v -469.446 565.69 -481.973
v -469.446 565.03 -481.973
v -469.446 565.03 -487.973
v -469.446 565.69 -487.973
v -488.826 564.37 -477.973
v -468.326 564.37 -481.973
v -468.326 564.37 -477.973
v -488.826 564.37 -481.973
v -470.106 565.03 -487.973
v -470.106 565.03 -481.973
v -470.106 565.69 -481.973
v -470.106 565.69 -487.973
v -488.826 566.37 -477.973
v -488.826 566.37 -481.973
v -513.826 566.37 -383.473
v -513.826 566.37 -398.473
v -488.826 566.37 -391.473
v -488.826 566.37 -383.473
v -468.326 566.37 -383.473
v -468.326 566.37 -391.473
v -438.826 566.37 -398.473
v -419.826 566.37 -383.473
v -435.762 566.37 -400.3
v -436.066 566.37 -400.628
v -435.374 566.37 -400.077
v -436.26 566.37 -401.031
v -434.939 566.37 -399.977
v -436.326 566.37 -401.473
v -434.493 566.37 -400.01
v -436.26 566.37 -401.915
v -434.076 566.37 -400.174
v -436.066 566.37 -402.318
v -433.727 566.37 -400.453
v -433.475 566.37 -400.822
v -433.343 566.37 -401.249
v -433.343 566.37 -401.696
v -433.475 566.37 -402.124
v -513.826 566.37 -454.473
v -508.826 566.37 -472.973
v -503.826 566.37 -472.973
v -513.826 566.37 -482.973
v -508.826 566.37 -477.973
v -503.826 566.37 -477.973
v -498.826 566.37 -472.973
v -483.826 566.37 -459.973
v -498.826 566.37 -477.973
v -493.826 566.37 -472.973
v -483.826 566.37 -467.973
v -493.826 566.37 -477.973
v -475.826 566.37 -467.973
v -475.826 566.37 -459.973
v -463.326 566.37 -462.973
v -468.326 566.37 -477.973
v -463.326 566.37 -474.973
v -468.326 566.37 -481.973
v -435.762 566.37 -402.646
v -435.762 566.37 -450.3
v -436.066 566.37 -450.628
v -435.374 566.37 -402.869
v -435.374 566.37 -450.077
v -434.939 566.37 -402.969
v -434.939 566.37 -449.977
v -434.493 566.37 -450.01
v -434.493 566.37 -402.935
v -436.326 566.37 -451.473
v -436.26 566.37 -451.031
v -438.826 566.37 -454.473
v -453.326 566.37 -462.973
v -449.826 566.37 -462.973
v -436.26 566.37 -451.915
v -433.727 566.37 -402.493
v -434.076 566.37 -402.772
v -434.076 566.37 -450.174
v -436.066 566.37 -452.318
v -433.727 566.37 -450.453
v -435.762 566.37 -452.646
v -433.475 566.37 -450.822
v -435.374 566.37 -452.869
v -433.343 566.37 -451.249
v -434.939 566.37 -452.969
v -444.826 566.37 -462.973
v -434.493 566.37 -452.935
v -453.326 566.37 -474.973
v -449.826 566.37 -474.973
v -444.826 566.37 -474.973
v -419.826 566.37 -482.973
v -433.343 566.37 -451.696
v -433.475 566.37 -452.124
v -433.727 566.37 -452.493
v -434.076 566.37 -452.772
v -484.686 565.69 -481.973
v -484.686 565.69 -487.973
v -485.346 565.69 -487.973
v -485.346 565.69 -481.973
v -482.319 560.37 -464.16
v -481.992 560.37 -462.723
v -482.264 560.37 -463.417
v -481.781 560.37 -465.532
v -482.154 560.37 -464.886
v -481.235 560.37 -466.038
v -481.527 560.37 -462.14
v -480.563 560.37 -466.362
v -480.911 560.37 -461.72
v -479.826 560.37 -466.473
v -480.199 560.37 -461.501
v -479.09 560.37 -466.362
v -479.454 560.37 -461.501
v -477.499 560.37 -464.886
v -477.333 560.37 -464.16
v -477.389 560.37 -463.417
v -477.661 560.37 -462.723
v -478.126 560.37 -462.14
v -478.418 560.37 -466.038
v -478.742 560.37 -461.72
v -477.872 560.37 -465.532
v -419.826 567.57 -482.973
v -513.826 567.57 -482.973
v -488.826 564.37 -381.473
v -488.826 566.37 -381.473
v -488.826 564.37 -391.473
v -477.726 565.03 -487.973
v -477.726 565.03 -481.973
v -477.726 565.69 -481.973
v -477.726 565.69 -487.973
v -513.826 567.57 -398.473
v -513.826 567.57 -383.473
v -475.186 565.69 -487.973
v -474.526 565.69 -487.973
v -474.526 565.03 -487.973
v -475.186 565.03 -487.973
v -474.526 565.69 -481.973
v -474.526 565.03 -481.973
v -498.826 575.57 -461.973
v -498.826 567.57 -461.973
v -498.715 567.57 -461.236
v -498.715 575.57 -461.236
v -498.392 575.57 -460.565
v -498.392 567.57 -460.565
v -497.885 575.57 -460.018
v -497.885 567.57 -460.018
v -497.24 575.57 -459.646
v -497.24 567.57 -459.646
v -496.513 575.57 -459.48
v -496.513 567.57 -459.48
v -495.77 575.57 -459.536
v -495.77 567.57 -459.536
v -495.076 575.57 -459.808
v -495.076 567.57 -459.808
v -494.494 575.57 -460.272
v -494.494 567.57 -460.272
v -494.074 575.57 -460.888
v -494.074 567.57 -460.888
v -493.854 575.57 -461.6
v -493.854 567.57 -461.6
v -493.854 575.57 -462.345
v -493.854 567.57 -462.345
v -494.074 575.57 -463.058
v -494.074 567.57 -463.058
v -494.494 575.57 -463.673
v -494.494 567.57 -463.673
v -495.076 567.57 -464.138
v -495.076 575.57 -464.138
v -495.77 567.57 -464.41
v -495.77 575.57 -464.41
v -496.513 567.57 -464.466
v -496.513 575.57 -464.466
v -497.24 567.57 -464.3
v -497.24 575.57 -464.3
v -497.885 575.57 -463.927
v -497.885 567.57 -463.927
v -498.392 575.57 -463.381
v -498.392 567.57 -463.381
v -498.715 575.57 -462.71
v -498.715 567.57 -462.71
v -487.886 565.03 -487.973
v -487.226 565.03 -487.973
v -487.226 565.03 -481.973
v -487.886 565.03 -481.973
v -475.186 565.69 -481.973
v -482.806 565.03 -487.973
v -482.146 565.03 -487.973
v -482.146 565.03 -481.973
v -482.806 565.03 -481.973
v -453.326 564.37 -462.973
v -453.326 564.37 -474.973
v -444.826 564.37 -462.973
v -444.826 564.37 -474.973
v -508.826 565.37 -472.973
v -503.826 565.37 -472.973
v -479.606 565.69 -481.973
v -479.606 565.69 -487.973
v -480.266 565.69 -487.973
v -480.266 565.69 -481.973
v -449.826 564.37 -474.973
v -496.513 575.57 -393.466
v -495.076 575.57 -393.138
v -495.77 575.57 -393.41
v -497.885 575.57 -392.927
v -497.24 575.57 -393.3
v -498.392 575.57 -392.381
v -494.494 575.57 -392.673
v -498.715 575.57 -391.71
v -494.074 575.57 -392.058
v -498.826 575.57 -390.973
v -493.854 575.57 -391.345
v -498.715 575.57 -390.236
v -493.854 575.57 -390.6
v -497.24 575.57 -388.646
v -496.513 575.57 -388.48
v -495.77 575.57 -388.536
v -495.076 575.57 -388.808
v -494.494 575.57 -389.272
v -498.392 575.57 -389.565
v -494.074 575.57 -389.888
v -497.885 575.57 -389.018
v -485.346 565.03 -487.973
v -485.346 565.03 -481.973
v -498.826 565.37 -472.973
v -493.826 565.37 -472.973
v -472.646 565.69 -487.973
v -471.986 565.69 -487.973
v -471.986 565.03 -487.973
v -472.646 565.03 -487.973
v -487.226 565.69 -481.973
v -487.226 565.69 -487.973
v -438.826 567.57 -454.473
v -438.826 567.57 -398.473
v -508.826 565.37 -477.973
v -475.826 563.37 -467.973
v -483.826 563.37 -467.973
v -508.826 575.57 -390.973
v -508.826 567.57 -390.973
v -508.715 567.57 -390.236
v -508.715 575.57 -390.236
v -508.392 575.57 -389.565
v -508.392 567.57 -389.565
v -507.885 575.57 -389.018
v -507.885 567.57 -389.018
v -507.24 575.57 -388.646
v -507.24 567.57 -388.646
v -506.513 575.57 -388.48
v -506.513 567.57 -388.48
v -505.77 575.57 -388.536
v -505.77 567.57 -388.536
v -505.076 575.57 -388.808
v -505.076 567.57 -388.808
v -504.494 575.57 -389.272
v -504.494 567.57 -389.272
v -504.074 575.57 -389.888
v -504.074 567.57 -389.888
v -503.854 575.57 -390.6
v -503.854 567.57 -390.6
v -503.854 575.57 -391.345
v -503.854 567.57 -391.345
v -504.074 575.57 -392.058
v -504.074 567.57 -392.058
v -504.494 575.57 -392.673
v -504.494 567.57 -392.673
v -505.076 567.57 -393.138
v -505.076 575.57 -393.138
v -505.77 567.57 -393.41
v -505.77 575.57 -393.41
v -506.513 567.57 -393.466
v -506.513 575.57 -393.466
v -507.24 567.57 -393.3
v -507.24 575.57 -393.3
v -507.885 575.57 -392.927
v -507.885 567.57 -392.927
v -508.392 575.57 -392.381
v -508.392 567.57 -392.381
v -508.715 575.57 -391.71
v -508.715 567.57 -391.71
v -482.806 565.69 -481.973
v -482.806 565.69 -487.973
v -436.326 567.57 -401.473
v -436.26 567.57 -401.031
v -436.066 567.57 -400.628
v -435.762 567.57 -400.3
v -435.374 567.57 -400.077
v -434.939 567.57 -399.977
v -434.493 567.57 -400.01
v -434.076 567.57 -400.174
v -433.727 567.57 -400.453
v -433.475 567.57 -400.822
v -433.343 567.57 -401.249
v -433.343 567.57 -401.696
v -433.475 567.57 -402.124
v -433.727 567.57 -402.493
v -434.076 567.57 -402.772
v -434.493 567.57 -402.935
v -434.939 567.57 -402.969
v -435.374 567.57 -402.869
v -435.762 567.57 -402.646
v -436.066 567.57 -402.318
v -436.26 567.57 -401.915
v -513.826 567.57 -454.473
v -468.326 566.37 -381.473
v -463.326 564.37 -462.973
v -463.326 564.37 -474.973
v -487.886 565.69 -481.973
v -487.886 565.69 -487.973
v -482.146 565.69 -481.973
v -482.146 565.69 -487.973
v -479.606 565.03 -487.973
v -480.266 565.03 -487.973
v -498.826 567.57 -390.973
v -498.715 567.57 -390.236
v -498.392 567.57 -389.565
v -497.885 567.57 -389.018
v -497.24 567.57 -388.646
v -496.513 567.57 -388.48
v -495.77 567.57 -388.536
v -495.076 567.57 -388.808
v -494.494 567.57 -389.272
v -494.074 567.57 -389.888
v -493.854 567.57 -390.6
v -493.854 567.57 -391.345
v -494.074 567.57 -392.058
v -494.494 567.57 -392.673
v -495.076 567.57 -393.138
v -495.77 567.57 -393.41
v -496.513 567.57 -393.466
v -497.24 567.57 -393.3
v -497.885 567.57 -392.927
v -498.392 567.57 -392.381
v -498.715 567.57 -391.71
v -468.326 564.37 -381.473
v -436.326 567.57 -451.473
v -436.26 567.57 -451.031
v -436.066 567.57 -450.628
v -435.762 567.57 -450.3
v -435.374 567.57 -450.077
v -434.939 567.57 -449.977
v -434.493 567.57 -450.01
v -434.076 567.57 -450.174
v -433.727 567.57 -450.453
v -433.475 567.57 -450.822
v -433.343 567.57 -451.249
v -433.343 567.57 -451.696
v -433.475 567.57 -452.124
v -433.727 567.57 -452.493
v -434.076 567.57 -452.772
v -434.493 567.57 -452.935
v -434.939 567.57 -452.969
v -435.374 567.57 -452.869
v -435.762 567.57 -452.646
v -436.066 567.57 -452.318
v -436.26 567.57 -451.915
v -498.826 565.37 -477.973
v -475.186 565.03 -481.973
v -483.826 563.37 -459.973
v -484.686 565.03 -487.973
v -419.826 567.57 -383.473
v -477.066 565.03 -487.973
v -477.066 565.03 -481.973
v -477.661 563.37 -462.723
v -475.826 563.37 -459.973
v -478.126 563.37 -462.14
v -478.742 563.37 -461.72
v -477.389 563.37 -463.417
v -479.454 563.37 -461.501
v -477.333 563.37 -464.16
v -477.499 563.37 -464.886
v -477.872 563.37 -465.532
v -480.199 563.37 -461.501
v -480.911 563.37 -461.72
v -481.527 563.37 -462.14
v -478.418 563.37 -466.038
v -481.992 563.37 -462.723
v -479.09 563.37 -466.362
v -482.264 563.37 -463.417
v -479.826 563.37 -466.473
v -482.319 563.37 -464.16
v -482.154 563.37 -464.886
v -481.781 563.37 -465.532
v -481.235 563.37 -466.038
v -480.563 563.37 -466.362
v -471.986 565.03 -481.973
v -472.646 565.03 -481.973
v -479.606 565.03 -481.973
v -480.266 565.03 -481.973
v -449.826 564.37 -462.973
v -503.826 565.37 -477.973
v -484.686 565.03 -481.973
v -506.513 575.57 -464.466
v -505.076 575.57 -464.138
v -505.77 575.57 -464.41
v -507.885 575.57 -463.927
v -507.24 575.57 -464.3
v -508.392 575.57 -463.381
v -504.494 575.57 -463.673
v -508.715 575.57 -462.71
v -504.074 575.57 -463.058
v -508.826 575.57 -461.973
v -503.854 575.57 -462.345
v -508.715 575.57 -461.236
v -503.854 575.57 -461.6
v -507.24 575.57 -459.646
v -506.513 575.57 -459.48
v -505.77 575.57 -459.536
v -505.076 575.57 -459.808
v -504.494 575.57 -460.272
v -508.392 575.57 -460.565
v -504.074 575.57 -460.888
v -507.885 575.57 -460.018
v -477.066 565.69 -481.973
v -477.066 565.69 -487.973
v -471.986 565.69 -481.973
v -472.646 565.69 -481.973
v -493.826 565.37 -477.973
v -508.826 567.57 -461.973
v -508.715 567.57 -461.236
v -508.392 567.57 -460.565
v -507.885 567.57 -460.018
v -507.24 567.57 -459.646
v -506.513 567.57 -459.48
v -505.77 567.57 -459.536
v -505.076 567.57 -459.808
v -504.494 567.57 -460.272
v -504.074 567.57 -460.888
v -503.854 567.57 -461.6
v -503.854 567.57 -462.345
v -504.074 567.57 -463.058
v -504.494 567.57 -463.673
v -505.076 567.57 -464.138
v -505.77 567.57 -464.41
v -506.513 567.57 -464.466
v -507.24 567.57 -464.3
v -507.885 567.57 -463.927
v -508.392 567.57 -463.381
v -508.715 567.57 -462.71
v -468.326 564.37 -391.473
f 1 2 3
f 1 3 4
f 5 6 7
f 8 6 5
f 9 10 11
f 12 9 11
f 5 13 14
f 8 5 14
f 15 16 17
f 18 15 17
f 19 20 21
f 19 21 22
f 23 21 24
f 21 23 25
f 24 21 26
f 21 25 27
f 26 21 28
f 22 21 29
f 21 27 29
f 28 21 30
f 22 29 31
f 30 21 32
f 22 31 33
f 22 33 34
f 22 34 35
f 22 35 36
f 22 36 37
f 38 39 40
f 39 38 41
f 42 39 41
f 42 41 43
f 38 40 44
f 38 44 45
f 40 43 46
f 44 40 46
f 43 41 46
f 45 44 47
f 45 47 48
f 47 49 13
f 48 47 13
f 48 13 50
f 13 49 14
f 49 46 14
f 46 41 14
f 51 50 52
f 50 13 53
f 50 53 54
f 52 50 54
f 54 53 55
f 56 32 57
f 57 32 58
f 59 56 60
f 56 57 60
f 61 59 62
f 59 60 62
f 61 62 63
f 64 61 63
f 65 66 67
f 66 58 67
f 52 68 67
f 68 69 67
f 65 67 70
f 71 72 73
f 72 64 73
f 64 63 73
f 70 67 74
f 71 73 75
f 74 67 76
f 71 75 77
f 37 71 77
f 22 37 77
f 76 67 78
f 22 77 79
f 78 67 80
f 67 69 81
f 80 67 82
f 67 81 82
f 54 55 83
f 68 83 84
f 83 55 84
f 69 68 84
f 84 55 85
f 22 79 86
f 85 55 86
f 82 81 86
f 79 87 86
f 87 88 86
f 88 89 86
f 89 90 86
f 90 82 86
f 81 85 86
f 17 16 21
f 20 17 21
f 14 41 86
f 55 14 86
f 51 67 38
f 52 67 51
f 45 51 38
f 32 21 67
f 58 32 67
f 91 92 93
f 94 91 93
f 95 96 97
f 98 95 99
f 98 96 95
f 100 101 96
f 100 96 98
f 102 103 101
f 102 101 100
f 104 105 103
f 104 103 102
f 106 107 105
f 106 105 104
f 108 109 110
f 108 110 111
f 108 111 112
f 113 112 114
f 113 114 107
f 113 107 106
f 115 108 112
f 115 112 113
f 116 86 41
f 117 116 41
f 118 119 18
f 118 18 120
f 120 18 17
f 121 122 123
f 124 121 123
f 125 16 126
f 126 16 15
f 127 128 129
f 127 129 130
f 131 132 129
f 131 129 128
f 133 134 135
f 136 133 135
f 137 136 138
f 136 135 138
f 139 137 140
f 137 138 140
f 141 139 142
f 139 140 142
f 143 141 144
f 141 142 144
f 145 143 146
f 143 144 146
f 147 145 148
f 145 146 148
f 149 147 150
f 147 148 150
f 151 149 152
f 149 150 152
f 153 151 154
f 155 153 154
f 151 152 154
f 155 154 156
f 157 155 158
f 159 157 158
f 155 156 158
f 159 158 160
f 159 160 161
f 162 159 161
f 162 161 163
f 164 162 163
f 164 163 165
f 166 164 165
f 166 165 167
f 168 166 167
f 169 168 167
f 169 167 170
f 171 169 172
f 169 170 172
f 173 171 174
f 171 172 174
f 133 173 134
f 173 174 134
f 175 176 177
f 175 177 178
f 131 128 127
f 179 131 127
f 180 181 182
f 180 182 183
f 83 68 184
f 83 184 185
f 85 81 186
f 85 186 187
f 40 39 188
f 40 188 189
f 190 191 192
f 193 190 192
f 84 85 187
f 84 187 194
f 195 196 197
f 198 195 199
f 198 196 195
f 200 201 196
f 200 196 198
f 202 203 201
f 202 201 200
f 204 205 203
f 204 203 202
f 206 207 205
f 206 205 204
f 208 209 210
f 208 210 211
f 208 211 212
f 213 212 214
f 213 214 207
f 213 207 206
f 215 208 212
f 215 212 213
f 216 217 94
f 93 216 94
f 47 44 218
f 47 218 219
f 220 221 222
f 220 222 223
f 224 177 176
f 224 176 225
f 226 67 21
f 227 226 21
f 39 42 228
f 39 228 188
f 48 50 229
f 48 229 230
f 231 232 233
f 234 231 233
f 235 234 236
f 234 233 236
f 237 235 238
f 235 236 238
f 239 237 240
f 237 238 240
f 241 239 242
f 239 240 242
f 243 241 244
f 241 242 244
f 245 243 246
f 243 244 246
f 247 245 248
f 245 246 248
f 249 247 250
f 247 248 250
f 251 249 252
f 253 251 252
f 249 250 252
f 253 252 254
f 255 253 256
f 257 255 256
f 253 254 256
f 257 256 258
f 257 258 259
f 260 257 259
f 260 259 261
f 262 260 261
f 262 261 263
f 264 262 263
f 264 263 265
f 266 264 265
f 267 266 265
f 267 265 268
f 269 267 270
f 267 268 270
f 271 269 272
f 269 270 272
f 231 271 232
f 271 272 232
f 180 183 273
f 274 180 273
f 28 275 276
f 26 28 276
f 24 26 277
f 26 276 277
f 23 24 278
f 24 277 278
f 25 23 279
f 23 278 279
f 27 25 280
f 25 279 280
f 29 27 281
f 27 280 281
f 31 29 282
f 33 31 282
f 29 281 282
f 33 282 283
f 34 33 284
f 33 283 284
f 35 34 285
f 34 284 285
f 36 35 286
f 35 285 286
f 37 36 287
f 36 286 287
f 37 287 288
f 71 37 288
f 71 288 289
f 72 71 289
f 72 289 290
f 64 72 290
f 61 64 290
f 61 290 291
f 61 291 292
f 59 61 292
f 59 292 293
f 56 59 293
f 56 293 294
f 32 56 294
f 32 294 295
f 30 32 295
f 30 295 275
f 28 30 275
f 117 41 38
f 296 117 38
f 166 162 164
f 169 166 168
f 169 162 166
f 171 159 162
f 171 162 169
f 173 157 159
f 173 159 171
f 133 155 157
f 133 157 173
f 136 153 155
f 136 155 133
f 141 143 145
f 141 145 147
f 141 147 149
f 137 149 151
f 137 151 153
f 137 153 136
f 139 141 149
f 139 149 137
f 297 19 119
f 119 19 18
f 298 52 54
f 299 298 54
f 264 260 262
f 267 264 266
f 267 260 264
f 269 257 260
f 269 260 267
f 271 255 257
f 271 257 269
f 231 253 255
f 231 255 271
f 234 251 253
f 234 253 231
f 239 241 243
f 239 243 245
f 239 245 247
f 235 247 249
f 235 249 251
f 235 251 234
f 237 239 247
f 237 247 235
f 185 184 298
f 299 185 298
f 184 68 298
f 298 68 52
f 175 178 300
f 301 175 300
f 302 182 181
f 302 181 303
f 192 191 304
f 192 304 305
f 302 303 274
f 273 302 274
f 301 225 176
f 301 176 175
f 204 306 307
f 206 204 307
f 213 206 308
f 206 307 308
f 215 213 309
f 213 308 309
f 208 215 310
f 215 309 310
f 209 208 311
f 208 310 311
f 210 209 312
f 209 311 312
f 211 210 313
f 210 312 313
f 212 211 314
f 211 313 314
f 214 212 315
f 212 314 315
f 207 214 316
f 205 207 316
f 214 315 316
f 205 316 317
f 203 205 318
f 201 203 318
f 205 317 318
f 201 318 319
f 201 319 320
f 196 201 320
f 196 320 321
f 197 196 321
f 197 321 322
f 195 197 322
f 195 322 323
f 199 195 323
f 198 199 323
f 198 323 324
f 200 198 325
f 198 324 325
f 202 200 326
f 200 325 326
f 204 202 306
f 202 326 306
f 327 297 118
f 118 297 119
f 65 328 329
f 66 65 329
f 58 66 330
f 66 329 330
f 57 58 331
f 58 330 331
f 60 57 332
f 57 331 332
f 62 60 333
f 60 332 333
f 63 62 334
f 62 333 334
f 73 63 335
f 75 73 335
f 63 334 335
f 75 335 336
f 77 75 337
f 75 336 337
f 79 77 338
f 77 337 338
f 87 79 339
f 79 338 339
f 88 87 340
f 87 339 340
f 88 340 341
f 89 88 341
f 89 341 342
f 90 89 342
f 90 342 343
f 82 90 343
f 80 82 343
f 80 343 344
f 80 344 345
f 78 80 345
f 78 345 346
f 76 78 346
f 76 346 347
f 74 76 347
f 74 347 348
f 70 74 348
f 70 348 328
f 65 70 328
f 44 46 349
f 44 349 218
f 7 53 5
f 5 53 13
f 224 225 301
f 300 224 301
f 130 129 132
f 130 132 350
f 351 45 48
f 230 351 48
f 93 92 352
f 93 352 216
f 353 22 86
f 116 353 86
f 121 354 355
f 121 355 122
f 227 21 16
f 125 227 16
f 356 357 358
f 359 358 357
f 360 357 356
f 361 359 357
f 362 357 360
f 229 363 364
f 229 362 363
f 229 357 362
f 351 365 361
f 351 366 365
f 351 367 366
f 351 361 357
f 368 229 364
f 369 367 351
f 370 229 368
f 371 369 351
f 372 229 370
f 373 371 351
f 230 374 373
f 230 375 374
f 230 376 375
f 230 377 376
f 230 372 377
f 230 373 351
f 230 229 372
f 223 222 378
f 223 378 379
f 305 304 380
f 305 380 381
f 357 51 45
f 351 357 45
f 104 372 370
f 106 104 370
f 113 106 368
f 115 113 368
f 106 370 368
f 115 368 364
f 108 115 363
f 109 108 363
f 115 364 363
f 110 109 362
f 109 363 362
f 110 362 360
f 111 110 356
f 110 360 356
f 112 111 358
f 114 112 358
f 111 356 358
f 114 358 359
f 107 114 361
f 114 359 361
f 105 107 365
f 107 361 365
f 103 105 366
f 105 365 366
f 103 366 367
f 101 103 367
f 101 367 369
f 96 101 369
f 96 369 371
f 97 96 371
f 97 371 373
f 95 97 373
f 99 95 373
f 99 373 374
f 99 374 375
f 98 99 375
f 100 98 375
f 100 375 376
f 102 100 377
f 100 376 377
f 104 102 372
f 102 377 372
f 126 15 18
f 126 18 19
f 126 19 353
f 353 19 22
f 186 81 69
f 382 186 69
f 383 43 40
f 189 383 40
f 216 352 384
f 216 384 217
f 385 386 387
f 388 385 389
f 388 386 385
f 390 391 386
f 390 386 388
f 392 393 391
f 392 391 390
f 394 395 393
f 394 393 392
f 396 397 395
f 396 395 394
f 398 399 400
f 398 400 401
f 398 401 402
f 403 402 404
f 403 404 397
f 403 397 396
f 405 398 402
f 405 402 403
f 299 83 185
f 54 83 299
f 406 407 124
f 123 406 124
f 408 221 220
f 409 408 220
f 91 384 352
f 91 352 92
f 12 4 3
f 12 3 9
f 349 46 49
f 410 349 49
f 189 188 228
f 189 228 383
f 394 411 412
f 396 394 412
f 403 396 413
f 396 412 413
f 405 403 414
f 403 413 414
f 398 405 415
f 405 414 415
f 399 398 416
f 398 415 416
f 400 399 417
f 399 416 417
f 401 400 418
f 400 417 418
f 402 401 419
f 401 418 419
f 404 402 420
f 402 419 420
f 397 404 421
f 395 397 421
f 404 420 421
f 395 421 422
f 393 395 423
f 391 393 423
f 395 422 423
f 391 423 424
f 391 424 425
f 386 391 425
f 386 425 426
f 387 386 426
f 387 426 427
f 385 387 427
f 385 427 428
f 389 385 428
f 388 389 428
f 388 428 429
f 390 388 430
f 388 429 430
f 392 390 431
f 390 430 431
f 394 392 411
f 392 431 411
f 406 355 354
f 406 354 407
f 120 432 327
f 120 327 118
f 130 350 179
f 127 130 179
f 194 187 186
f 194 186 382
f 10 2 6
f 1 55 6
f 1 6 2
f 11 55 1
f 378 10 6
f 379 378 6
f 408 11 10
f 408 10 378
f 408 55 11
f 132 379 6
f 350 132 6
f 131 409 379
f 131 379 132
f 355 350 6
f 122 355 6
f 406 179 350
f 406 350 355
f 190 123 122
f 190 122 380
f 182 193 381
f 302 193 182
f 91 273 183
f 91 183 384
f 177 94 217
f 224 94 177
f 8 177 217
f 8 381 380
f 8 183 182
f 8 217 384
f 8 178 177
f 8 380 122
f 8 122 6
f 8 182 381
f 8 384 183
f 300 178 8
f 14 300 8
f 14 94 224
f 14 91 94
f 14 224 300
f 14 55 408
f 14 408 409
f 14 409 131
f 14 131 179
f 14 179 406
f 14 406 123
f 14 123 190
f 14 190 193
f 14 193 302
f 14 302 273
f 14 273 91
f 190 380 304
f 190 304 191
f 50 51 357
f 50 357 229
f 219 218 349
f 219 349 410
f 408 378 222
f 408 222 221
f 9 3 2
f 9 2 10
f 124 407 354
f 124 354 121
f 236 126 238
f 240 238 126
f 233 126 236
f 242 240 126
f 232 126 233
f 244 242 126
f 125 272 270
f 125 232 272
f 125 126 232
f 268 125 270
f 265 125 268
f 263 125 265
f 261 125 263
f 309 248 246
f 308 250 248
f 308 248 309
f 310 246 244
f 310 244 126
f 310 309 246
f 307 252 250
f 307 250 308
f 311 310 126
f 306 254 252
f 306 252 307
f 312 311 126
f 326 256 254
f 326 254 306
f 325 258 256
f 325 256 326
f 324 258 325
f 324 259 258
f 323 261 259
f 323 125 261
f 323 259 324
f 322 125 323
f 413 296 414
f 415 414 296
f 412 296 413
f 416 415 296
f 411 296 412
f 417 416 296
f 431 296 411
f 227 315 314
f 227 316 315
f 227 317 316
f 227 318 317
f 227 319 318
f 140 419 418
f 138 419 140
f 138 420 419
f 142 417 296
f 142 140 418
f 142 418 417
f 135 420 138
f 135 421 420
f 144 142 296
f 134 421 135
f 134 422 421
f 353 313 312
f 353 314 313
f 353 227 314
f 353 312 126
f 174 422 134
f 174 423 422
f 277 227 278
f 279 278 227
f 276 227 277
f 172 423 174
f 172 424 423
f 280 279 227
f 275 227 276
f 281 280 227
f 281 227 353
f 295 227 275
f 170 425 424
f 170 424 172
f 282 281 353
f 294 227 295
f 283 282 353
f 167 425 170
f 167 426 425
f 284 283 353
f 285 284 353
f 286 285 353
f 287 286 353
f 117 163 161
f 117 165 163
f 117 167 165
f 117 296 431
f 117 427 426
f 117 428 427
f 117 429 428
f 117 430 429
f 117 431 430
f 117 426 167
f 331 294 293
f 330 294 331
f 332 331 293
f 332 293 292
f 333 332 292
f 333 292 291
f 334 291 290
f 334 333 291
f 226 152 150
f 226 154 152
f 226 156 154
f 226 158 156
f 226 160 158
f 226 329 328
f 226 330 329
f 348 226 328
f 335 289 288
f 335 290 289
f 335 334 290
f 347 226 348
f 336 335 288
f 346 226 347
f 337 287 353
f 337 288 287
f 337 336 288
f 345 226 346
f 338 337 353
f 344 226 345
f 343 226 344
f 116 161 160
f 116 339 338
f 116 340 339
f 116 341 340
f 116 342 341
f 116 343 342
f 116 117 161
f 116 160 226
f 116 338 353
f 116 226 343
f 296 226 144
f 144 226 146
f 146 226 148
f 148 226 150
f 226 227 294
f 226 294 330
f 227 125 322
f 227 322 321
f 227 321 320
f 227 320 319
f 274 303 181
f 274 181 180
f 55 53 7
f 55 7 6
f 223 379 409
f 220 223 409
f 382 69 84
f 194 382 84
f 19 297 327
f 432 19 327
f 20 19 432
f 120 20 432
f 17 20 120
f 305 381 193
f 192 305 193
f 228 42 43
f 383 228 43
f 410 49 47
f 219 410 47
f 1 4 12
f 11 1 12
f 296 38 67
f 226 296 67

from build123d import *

# Parameters (mm, degrees)
DODANIE_WYCI_GNI_CIE1_DEPTH = 1.2
SZKIC3_R                    = 2.5
DODANIE_WYCI_GNI_CIE2_DEPTH = 8
SZKIC4_R                    = 1.5
WYTNIJ_WYCI_GNI_CIE1_DEPTH  = 706.226503642
SZKIC5_W                    = 5
SZKIC5_H                    = 5
DODANIE_WYCI_GNI_CIE3_DEPTH = 1
SZKIC6_W                    = 8
SZKIC6_H                    = 8
DODANIE_WYCI_GNI_CIE4_DEPTH = 3
SZKIC7_R                    = 2.5
DODANIE_WYCI_GNI_CIE5_DEPTH = 3
SZKIC8_W                    = 20.5
SZKIC8_H                    = 4
SZKIC8_H_2                  = 10
DODANIE_WYCI_GNI_CIE6_DEPTH = 2
SZKIC9_W                    = 0.66
SZKIC9_H                    = 0.66
DODANIE_WYCI_GNI_CIE7_DEPTH = 6
SZYK_LINIOWY1_COUNT         = 8
SZYK_LINIOWY1_PITCH         = 2.54
SZKIC10_W                   = 10
SZKIC10_H                   = 12
SZKIC10_W_2                 = 5
DODANIE_WYCI_GNI_CIE8_DEPTH = 2


with BuildPart() as part:
    # Szkic2 → Dodanie-wyciągnięcie1 (new body)
    with BuildSketch(Plane(origin=(0, 566.370308932, 0), x_dir=(1, 0, 0), z_dir=(0, 1, 0))):
        Polygon((-513.826446608, 398.472881439), (-513.826446608, 383.472881439), (-419.826446608, 383.472881439), (-419.826446608, 482.972881439), (-513.826446608, 482.972881439), (-513.826446608, 454.472881439), (-438.826446608, 454.472881439), (-438.826446608, 398.472881439), align=None)
    extrude(amount=DODANIE_WYCI_GNI_CIE1_DEPTH)

    # Szkic3 → Dodanie-wyciągnięcie2 (add)
    with BuildSketch(Plane(origin=(0, 567.570308932, 0), x_dir=(1, 0, 0), z_dir=(0, 1, 0))):
        with Locations(Location((-506.326446608, 461.972881439, 0), (0, 0, 180))):
            Circle(SZKIC3_R)
        with Locations(Location((-496.326446608, 461.972881439, 0), (0, 0, 180))):
            Circle(SZKIC3_R)
        with Locations(Location((-496.326446608, 390.972881439, 0), (0, 0, 180))):
            Circle(SZKIC3_R)
        with Locations(Location((-506.326446608, 390.972881439, 0), (0, 0, 180))):
            Circle(SZKIC3_R)
    extrude(amount=DODANIE_WYCI_GNI_CIE2_DEPTH)

    # Szkic4 → Wytnij-wyciągnięcie1 (cut, through all)
    with BuildSketch(Plane(origin=(0, 567.570308932, 0), x_dir=(1, 0, 0), z_dir=(0, 1, 0))):
        with Locations(Location((-434.826446608, 401.472881439, 0), (0, 0, 180))):
            Circle(SZKIC4_R)
        with Locations(Location((-434.826446608, 451.472881439, 0), (0, 0, 180))):
            Circle(SZKIC4_R)
    extrude(amount=-WYTNIJ_WYCI_GNI_CIE1_DEPTH, mode=Mode.SUBTRACT)

    # Szkic5 → Dodanie-wyciągnięcie3 (add)
    with BuildSketch(Plane.XZ.offset(-566.370308932)):
        with Locations((-506.326446608, -475.472881439)):
            Rectangle(SZKIC5_W, SZKIC5_H)
        with Locations((-496.326446608, -475.472881439)):
            Rectangle(SZKIC5_W, SZKIC5_H)
    extrude(amount=DODANIE_WYCI_GNI_CIE3_DEPTH)

    # Szkic6 → Dodanie-wyciągnięcie4 (add)
    with BuildSketch(Plane(origin=(0, 566.370308932, 0), x_dir=(-1, 0, 0), z_dir=(0, -1, 0))):
        with Locations((479.826446608, 463.972881439)):
            Rectangle(SZKIC6_W, SZKIC6_H)
    extrude(amount=DODANIE_WYCI_GNI_CIE4_DEPTH)

    # Szkic7 → Dodanie-wyciągnięcie5 (add)
    with BuildSketch(Plane.XZ.offset(-563.370308932)):
        with Locations(Location((-479.826446608, -463.972881439, 0), (0, 0, 270))):
            Circle(SZKIC7_R)
    extrude(amount=DODANIE_WYCI_GNI_CIE5_DEPTH)

    # Szkic8 → Dodanie-wyciągnięcie6 (add)
    with BuildSketch(Plane(origin=(0, 566.370308932, 0), x_dir=(-1, 0, 0), z_dir=(0, -1, 0))):
        with Locations((478.576446608, 479.972881439)):
            Rectangle(SZKIC8_W, SZKIC8_H)
        with Locations((478.576446608, 386.472881439)):
            Rectangle(SZKIC8_W, SZKIC8_H_2)
    extrude(amount=DODANIE_WYCI_GNI_CIE6_DEPTH)

    # Szkic9 → Dodanie-wyciągnięcie7 (add)
    with BuildSketch(Plane(origin=(0, 0, -481.972881439), x_dir=(-1, 0, 0), z_dir=(0, 0, -1))):
        with Locations((487.556446608, 565.360308932)):
            Rectangle(SZKIC9_W, SZKIC9_H)
    dodanie_wyci_gni_cie7 = extrude(amount=DODANIE_WYCI_GNI_CIE7_DEPTH)

    # Szyk liniowy1: Dodanie-wyciągnięcie7 ×8
    with Locations(*[(i * SZYK_LINIOWY1_PITCH, 0, 0) for i in range(1, SZYK_LINIOWY1_COUNT)]):
        add(dodanie_wyci_gni_cie7)

    # Szkic10 → Dodanie-wyciągnięcie8 (add)
    with BuildSketch(Plane(origin=(0, 566.370308932, 0), x_dir=(-1, 0, 0), z_dir=(0, -1, 0))):
        with Locations((458.326446608, 468.972881439)):
            Rectangle(SZKIC10_W, SZKIC10_H)
        with Locations((447.326446608, 468.972881439)):
            Rectangle(SZKIC10_W_2, SZKIC10_H)
    extrude(amount=DODANIE_WYCI_GNI_CIE8_DEPTH)


solid = part.part
